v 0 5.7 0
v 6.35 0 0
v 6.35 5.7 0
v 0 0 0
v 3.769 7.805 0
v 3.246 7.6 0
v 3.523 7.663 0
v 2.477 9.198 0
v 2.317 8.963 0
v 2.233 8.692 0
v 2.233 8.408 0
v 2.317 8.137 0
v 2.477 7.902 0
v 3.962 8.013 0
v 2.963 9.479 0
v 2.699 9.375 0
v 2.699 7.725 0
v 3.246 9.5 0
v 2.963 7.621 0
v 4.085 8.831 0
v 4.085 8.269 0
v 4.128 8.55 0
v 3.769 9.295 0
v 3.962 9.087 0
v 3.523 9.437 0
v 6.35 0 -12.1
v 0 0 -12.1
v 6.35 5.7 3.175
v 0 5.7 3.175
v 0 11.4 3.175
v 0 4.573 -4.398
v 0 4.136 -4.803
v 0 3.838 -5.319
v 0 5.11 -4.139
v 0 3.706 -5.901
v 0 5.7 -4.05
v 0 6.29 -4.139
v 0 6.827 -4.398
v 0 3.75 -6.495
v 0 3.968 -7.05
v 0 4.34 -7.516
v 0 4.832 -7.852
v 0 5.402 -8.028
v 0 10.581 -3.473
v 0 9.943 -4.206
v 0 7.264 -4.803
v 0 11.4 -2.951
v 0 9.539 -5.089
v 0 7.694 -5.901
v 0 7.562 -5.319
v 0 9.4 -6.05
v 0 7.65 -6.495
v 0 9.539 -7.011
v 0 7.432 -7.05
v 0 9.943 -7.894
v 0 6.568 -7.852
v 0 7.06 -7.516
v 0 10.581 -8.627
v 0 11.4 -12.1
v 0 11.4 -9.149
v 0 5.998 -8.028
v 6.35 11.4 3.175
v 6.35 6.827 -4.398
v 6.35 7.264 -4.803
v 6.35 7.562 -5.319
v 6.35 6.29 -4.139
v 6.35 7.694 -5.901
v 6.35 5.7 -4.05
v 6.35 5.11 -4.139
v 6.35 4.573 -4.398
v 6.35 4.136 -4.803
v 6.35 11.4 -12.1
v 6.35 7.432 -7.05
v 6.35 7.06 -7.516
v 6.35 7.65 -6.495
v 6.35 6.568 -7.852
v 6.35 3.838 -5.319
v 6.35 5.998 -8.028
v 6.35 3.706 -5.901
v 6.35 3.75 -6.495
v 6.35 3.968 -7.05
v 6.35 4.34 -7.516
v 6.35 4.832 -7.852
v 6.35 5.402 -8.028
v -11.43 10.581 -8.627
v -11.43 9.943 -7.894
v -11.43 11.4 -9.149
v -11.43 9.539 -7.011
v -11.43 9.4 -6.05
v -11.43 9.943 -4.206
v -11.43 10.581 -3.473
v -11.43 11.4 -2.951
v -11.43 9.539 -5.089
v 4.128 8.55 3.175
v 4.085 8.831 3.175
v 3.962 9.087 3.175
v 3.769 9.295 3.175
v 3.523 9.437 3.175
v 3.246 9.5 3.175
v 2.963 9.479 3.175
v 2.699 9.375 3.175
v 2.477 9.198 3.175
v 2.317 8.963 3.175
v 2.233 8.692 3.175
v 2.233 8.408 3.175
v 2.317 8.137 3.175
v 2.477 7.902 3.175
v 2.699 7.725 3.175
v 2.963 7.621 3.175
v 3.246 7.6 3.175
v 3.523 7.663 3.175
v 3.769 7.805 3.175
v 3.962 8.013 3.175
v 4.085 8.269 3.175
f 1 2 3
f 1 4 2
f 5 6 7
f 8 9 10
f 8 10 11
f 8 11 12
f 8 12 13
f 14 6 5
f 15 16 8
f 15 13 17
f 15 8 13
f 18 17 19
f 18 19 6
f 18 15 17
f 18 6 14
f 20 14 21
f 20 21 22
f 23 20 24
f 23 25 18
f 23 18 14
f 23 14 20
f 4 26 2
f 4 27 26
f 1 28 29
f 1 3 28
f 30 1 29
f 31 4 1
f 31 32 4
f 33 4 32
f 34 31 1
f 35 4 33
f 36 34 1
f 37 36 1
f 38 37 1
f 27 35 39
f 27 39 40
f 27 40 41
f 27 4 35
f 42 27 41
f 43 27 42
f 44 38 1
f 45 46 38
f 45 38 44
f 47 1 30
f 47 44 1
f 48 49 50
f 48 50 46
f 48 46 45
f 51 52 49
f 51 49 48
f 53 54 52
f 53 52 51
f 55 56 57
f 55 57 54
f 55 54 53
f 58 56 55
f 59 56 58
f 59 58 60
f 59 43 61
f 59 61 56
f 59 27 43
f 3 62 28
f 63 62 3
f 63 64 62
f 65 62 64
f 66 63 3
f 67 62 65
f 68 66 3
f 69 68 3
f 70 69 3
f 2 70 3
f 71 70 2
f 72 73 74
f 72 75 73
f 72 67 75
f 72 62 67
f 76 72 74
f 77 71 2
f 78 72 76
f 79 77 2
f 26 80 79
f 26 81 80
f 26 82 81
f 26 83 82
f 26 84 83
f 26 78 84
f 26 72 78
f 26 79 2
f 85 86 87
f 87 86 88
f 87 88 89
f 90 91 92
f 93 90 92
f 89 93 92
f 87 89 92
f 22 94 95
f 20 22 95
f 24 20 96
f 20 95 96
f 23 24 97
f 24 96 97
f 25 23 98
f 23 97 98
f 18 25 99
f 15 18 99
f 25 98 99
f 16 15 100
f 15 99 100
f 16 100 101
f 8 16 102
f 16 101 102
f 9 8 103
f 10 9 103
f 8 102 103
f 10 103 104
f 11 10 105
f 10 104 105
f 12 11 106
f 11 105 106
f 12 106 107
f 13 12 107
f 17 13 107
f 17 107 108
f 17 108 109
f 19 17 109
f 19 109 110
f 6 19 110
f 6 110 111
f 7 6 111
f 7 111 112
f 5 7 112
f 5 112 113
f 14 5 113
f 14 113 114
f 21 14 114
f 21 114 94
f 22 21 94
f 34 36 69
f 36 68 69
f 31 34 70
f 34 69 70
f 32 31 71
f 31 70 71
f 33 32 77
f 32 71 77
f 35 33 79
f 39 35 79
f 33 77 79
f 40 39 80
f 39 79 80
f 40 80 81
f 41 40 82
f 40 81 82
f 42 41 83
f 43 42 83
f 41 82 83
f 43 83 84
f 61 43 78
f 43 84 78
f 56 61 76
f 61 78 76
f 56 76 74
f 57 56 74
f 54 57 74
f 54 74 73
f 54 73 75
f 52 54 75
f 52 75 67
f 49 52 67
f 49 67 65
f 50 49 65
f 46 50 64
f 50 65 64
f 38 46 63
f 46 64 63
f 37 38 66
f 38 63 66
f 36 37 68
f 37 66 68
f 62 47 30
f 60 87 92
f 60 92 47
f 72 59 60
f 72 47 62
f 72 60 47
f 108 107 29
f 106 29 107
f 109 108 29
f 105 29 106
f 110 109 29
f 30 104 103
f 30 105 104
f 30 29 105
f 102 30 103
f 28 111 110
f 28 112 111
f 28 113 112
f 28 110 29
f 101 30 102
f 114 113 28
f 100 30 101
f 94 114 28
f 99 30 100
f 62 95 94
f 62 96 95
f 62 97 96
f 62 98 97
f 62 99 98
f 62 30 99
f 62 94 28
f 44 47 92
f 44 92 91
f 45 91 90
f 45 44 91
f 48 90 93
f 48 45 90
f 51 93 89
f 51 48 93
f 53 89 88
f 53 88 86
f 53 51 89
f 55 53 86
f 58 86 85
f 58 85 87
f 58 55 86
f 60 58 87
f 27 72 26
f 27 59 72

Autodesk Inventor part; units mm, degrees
ref_plane "YZ Plane" through (0, 0, 0) normal (1, 0, 0) x (0, 1, 0)
ref_plane "XZ Plane" through (0, 0, 0) normal (0, 1, 0) x (-1, 0, 0)
ref_plane "XY Plane" through (0, 0, 0) normal (0, 0, 1) x (1, 0, 0)
sketch "Sketch1" plane through (0, 0, 0) normal (1, 0, 0) x (0, 1, 0)
  line L0 (0, 0) -> (11.4, 0)
  line L1 (11.4, 0) -> (11.4, -12.1)
  line L2 (11.4, -12.1) -> (0, -12.1)
  line L3 (0, -12.1) -> (0, 0)
  arc A0 (11.4, -2.9512) -> (11.4, -9.1488) centre (12.8006, -6.05) ccw
  point P0 (3.5, -5)
  dimension "d0" = 11.4
  dimension "d1" = 12.1
  dimension "d2" = 6.1976
  dimension "d3" = 2.9512
  dimension "d29" = 2
extrude "Extrusion1" add sketch "Sketch1" along normal blind 6.35
extrude "Extrusion2" add sketch "Sketch1" against normal blind 11.43 contours L1 A0
sketch "Sketch3" plane through (0, 0, 0) normal (-1, 0, 0) x (0, 0, 1)
  line L0 (0, 11.4) -> (0, 0) projected
  line L1 (0, 0) -> (-12.1, 0) projected
  point P0 (-6.05, 5.7)
  dimension "d19" = 12.1
  dimension "d20" = 6.05
  dimension "d30" = 11.4
  dimension "d31" = 5.7
sketch "Sketch6" plane through (0, 0, 0) normal (0, 0, 1) x (1, 0, 0)
  line L0 (6.35, 5.7) -> (0, 5.7)
  line L1 (0, 0) -> (0, 11.4) projected
  line L2 (6.35, 11.4) -> (6.35, 0) projected
  line L3 (0, 0) -> (6.35, 0) projected
  line L4 (0, 11.4) -> (6.35, 11.4) projected
  dimension "d33" = 11.4
  dimension "d46" = 5.7
hole "Hole2" at (0, 5.7, -6.05) direction (1, 0, 0) diameter 4 end through all
extrude "Extrusion8" add sketch "Sketch6" along normal blind 3.175 contours L0 L1 L4 L2
sketch "Sketch7" plane through (0, 0, 3.175) normal (0, 0, 1) x (1, 0, 0)
  line L0 (6.35, 11.4) -> (0, 11.4) projected
  line L1 (6.35, 5.7) -> (6.35, 11.4) projected
  point P0 (0, 0)
  point P1 (3.175, 8.55)
  dimension "d50" = 6.35
  dimension "d51" = 5.7
  dimension "d52" = 2.85
  dimension "d53" = 3.175
sketch "Sketch8" plane through (0, 0, 3.175) normal (0, 0, 1) x (1, 0, 0)
  circle A0 centre (3.175, 8.55) radius 0.9525
  line L0 (6.35, 11.4) -> (0, 11.4) projected
  line L1 (6.35, 5.7) -> (6.35, 11.4) projected
  point P0 (0, 0)
  dimension "d63" = 2.85
  dimension "d64" = 3.175
  dimension "d65" = 1.905
extrude "Extrusion9" cut sketch "Sketch8" against normal up to surface (3.175 mm away)
equation "\"d3\" = -0.5 * d2 + 0.5 * d1"
equation "\"d20\" = 0.5 * d19"
equation "\"d31\" = 0.5 * d30"
equation "\"d46\" = 0.5 * d33"
equation "\"d52\" = 0.5 * d51"
equation "\"d53\" = 0.5 * d50"
equation "\"d63\" = d52"
equation "\"d64\" = d53"
properties part number "end peice for slides"
